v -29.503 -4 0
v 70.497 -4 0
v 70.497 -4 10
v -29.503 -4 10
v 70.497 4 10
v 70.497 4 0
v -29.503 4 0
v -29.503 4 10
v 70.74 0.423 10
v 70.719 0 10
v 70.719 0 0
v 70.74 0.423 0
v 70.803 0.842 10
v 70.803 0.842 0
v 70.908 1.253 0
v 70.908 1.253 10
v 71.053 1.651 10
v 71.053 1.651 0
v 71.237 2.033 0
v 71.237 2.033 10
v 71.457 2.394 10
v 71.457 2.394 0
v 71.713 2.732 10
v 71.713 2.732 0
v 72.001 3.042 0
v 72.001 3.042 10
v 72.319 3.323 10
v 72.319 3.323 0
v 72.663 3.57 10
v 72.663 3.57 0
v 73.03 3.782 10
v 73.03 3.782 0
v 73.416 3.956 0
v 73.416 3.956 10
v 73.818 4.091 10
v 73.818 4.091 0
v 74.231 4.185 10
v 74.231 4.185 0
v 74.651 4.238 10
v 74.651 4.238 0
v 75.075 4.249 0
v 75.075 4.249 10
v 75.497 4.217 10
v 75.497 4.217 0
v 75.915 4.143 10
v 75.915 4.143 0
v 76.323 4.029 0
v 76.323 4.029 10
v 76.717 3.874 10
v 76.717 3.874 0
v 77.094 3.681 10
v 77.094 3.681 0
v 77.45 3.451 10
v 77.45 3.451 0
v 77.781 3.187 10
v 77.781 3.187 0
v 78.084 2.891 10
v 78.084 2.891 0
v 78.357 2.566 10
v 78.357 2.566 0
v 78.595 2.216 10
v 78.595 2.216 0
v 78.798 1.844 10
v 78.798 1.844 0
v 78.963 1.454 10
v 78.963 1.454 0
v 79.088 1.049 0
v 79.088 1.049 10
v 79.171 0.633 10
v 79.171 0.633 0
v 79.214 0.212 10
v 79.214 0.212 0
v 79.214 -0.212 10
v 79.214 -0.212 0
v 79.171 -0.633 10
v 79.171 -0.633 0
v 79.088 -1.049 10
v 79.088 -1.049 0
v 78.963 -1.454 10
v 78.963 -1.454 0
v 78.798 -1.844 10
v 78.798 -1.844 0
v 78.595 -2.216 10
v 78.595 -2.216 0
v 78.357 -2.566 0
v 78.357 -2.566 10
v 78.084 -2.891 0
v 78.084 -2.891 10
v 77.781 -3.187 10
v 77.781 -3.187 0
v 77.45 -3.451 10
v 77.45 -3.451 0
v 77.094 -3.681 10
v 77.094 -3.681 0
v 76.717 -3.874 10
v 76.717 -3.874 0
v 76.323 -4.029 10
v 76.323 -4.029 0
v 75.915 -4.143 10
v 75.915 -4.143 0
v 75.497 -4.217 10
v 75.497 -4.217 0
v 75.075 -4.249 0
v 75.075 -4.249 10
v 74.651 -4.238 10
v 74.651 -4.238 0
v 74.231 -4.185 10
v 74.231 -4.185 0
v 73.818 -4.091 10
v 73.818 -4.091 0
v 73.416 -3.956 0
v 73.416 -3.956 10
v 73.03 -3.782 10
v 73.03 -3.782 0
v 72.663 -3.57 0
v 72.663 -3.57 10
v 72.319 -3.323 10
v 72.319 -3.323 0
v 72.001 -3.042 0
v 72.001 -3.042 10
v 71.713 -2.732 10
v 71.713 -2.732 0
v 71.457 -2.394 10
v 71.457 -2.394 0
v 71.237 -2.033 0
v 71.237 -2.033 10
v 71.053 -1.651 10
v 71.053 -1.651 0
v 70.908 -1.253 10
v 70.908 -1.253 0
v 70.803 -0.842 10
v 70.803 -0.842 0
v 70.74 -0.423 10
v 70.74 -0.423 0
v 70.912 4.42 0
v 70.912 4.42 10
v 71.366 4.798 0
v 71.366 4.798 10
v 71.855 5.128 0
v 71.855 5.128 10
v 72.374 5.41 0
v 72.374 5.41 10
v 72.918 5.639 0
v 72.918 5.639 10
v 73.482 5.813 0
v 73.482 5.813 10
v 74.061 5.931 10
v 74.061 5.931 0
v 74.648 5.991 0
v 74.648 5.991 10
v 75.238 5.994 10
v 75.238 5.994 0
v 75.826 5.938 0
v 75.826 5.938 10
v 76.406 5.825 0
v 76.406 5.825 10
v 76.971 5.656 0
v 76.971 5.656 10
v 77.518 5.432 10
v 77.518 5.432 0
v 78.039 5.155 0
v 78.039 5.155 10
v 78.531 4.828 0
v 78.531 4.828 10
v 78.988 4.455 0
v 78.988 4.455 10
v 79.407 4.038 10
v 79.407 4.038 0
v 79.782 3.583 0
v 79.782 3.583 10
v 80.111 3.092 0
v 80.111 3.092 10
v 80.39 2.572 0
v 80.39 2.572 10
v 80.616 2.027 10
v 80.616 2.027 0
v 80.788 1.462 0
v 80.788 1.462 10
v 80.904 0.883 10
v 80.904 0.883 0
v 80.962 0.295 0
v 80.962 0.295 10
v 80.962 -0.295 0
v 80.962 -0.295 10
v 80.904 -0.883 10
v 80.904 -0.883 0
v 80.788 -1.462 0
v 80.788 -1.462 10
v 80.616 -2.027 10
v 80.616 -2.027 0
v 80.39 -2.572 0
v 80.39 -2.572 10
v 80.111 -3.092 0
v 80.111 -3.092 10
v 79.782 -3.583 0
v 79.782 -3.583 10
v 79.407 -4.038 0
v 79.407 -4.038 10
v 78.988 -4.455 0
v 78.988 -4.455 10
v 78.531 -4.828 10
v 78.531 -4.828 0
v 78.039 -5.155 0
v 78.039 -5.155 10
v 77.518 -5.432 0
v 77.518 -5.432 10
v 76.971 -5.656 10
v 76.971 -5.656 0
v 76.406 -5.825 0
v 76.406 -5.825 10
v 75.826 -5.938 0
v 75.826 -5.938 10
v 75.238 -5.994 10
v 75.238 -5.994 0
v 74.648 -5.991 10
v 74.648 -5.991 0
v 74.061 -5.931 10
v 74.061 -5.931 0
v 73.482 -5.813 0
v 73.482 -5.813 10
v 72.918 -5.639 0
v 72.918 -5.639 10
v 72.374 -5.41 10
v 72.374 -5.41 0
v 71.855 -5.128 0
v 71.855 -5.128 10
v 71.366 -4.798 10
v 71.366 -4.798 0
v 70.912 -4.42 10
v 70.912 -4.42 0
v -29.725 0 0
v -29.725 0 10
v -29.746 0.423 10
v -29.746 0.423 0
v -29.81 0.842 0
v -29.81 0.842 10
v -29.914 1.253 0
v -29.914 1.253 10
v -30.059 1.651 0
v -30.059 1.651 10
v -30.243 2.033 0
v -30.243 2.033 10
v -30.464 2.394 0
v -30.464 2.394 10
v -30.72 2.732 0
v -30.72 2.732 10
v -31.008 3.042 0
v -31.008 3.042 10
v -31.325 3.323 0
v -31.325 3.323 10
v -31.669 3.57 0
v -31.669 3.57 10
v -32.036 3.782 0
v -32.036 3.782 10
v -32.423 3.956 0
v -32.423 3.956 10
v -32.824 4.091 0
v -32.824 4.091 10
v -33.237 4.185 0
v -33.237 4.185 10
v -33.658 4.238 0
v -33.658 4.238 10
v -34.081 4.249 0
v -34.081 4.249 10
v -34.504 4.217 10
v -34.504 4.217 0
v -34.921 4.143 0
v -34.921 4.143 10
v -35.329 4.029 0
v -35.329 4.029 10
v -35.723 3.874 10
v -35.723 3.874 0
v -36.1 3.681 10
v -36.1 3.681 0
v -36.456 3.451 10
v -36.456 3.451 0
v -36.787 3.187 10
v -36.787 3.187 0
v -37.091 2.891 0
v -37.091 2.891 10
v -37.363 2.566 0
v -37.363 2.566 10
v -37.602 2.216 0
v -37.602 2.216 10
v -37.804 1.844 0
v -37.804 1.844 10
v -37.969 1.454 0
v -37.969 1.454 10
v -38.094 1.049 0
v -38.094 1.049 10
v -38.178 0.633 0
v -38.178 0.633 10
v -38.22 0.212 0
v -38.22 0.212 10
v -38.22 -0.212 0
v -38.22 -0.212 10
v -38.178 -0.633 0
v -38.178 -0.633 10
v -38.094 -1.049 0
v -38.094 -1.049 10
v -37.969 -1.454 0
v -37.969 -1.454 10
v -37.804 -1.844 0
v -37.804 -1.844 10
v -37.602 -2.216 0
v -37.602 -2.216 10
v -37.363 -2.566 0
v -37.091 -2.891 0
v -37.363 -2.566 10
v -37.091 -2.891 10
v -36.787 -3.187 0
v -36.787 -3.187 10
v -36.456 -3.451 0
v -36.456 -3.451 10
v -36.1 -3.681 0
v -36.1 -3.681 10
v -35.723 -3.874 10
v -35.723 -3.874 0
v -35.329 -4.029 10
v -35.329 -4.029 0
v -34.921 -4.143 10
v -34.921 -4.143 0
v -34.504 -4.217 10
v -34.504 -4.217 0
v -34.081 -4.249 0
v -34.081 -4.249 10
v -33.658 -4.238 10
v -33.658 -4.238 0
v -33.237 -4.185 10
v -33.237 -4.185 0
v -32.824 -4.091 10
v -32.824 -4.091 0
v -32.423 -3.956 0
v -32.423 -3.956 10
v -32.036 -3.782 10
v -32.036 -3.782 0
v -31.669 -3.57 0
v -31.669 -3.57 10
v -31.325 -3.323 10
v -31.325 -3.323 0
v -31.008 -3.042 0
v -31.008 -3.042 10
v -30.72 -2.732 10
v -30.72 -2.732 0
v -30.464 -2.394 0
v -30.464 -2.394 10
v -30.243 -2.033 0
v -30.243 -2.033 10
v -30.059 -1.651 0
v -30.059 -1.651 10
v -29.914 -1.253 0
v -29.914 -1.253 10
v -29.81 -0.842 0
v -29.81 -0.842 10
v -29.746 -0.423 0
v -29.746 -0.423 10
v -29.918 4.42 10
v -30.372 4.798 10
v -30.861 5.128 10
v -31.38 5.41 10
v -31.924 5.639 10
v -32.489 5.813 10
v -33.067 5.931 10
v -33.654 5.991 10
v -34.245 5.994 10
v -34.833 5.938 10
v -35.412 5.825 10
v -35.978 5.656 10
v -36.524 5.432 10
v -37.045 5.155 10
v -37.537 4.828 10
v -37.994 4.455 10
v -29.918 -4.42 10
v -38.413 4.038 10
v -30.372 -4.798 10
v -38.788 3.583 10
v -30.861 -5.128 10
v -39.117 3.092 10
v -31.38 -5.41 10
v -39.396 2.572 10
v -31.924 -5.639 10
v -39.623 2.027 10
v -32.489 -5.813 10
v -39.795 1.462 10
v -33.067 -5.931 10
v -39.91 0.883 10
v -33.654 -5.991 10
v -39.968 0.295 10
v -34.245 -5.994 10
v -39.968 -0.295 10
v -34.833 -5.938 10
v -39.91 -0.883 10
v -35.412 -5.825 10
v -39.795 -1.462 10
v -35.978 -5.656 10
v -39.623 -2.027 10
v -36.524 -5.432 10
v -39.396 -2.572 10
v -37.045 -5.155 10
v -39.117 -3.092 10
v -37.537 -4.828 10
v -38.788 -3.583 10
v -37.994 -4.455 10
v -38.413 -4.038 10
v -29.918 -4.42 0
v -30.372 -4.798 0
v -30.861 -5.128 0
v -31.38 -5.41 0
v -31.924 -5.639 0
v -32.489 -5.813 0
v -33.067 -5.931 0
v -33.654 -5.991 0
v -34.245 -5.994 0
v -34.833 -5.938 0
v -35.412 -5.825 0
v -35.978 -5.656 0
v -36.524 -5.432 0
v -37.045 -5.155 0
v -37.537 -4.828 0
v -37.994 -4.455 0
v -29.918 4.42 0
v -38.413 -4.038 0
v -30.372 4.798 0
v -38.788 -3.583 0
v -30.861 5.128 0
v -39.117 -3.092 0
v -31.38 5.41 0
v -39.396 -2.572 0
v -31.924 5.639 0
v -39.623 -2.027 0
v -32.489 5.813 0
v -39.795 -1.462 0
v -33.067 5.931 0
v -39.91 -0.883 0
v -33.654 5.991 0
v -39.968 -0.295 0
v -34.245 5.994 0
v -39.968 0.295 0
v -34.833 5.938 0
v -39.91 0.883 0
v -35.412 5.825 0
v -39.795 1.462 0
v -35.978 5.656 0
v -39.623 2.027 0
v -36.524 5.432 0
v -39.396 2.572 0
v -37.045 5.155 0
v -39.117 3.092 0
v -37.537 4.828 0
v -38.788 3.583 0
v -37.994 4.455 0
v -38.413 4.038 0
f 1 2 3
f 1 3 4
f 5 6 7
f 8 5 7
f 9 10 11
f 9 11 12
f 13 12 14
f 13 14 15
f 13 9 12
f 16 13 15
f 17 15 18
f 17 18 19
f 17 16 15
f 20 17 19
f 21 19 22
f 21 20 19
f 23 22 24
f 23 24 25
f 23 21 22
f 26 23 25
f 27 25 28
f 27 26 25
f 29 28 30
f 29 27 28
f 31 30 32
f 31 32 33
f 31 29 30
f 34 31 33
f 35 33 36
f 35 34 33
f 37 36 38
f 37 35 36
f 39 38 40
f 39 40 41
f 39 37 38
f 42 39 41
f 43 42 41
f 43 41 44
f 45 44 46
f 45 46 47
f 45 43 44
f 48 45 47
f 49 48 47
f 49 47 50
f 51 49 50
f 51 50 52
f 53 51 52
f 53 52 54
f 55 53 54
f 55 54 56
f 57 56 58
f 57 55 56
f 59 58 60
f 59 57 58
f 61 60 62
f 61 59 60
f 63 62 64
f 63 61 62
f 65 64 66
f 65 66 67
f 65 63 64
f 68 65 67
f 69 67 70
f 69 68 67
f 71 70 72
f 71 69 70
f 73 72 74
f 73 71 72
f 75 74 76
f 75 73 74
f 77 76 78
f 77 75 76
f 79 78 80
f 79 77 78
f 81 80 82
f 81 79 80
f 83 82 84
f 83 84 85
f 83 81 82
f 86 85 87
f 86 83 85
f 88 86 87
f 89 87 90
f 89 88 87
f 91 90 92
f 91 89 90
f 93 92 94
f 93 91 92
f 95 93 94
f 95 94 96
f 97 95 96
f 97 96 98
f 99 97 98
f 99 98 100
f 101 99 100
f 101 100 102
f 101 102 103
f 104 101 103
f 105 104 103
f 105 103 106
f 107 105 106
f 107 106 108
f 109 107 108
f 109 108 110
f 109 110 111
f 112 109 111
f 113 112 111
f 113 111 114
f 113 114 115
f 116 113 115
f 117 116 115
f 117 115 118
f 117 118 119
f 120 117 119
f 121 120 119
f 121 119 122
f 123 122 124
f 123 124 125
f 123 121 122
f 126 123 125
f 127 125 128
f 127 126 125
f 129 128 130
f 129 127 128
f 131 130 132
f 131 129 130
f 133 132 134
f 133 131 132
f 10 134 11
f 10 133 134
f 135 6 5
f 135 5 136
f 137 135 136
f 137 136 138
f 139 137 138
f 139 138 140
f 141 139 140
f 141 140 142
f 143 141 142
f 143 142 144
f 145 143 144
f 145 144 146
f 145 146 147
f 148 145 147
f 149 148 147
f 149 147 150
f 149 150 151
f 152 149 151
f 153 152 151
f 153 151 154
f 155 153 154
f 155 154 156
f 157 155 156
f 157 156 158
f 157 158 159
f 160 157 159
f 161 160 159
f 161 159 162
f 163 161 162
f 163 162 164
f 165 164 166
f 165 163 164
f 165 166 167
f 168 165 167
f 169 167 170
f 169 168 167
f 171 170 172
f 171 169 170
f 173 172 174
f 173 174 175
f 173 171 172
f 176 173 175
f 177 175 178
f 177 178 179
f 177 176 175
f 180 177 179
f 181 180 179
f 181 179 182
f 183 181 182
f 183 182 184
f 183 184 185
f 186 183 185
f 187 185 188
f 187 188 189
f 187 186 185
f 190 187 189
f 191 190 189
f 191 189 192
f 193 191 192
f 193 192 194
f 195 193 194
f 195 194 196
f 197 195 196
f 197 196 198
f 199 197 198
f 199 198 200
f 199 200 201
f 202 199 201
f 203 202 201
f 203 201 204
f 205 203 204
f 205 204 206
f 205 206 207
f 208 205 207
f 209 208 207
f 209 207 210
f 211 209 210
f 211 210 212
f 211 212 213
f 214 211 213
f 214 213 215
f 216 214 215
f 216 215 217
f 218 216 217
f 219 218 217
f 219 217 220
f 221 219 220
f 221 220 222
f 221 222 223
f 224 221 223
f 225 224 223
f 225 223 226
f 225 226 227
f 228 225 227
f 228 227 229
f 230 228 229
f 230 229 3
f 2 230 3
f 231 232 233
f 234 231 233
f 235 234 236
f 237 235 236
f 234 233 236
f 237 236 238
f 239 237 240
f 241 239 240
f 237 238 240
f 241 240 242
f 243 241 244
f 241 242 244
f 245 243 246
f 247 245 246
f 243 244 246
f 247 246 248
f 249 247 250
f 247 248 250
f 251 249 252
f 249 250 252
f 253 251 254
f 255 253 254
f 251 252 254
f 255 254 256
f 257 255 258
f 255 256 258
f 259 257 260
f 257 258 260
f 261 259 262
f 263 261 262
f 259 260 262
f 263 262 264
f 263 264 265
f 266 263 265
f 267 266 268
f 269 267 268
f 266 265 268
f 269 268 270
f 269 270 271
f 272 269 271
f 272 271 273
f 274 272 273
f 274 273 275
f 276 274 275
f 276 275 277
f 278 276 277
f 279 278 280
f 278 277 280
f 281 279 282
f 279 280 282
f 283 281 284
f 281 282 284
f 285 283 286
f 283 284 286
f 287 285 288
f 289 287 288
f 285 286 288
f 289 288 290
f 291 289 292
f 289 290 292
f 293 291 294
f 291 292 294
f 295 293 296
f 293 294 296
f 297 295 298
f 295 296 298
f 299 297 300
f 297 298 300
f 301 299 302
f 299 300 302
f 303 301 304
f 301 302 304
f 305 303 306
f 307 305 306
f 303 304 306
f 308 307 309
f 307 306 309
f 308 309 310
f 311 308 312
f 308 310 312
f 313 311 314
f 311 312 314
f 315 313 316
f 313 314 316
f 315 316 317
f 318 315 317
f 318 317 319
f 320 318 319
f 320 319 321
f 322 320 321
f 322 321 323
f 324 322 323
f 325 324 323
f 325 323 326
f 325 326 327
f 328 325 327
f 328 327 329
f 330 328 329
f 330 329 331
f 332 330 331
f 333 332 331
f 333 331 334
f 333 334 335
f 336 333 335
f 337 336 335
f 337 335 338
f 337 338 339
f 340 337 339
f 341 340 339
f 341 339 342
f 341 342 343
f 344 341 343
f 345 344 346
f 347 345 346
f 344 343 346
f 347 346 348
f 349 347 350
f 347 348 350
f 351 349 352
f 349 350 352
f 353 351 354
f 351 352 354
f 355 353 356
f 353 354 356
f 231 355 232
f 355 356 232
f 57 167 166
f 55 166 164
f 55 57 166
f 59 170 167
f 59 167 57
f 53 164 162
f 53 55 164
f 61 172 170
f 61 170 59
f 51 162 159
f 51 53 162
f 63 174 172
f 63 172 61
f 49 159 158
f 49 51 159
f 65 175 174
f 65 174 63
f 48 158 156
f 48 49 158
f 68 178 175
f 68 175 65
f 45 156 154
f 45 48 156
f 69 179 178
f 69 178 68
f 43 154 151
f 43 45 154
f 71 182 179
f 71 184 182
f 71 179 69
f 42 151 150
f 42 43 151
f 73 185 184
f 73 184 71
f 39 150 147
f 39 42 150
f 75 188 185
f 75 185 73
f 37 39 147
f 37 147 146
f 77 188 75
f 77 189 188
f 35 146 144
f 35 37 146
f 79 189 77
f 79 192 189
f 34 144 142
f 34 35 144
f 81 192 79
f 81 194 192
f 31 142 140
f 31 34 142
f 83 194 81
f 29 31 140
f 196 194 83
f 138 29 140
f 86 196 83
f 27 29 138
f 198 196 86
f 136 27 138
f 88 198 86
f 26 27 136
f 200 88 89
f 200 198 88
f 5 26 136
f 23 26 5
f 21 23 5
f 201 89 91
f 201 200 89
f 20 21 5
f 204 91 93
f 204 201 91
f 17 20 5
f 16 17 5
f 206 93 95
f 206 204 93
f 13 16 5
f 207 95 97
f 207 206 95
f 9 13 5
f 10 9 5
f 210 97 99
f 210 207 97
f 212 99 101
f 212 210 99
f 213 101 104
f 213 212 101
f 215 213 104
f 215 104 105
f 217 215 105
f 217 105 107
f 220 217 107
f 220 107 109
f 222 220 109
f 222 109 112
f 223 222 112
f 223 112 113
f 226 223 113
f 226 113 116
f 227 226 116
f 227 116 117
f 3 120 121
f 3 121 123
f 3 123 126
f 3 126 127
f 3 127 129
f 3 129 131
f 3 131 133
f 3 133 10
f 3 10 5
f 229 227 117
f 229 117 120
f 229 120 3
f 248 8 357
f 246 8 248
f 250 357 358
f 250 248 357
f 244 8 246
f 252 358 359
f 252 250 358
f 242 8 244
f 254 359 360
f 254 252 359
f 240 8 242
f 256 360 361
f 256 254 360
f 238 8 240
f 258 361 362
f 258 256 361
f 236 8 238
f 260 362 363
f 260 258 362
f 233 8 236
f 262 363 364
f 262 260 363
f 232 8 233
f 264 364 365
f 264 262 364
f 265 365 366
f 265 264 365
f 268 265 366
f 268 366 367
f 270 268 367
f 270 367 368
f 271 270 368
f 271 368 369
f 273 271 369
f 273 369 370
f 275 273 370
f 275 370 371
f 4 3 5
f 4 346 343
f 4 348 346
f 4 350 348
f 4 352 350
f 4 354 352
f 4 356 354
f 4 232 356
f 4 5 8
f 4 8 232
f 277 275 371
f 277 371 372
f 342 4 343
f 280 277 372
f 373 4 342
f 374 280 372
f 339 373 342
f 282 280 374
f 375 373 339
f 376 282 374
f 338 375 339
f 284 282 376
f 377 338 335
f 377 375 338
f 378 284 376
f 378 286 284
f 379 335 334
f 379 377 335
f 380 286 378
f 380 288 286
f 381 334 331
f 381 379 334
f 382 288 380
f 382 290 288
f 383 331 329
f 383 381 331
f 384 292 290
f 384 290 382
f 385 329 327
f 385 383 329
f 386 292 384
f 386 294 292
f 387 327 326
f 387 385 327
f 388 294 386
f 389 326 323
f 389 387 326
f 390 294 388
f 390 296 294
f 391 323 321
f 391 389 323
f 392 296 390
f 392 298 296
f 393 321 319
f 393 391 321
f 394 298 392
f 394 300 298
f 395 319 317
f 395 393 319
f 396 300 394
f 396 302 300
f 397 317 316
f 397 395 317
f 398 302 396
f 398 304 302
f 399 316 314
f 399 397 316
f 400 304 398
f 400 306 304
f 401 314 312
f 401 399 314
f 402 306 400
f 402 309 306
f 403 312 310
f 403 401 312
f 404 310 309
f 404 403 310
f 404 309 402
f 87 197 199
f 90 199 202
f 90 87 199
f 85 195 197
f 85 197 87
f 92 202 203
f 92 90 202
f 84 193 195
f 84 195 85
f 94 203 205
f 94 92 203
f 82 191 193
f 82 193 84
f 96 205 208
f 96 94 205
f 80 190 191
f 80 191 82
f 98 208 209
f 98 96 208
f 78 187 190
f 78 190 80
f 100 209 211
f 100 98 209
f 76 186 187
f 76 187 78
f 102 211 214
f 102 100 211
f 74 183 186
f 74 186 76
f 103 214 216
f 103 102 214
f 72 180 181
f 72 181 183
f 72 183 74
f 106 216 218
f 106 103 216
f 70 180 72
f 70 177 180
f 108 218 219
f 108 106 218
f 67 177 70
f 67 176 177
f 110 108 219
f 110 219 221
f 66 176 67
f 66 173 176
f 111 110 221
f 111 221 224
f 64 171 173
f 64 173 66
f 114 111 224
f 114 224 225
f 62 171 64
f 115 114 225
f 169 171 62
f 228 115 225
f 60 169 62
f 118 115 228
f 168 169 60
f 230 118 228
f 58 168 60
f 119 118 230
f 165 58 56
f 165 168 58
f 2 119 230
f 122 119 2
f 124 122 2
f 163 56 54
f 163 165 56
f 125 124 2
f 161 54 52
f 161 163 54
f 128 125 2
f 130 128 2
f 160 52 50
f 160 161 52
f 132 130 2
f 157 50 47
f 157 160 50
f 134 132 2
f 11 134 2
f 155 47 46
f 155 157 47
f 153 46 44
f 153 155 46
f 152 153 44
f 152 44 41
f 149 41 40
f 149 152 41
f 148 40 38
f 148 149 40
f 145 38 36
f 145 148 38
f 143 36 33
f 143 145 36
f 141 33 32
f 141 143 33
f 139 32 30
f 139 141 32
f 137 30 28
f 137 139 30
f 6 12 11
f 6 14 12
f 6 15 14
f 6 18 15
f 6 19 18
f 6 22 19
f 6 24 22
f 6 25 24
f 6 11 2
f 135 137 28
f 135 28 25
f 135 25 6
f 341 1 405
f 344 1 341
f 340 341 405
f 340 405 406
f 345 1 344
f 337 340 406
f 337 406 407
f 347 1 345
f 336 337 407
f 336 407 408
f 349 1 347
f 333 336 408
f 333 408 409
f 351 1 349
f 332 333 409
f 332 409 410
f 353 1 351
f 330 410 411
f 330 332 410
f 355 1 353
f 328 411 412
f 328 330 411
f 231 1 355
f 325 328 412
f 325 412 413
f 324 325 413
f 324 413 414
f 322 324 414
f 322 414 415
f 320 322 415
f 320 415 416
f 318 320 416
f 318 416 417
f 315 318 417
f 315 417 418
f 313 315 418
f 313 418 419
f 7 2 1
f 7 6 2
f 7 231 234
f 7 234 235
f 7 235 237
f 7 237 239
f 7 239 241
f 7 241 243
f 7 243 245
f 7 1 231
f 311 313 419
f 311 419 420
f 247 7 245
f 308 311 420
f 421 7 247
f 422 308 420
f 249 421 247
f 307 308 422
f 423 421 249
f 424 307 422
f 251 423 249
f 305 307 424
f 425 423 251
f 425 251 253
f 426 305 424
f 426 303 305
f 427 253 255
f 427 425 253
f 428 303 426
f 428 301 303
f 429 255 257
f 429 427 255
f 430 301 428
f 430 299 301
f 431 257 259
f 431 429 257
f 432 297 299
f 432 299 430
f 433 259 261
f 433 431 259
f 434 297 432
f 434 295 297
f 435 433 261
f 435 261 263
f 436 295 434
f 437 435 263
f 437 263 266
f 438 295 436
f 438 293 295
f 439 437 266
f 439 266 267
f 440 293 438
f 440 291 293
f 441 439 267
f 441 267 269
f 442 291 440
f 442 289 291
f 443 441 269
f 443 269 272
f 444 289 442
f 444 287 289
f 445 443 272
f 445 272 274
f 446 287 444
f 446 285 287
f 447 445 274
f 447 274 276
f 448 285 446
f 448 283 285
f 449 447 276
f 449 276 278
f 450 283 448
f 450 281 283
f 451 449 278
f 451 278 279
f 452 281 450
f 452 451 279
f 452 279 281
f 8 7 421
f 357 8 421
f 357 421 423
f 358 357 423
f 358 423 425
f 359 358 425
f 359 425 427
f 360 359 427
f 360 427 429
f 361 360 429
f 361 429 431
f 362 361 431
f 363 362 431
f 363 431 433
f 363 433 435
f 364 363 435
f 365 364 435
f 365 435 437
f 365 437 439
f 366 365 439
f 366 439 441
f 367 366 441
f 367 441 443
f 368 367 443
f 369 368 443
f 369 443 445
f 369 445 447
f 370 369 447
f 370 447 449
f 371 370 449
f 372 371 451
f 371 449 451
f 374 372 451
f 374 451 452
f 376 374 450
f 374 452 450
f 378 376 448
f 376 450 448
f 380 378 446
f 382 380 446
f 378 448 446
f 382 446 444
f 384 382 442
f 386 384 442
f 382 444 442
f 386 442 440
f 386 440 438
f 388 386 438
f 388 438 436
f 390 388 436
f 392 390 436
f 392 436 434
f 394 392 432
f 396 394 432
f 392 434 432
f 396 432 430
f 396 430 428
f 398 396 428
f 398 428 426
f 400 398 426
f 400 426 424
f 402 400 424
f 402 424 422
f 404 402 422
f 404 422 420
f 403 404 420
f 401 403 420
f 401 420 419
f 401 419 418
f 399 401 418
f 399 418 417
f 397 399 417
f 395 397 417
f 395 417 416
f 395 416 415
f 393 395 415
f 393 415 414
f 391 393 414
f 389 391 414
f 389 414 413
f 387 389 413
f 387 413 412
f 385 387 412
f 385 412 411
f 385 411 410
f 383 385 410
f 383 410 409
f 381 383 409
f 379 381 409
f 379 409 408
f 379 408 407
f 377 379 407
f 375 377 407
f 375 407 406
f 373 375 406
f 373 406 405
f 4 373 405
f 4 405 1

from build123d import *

# Parameters (mm, degrees)
F0_R     = 6
F1_DEPTH = 10
F2_R     = 4.25
F3_DEPTH = 10
F4_W     = 50
F4_H     = 8
F5_DEPTH = 10


with BuildPart() as f1:
    # F0 (on Top) → F1 (new body)
    with BuildSketch(Plane.XY):
        with Locations((-33.975307, 0)):
            Circle(F0_R)
    extrude(amount=F1_DEPTH)

    # F2 (on face) → F3 (cut)
    with BuildSketch(Plane.XY.offset(10)):
        with Locations((-33.975307, 0)):
            Circle(F2_R)
    extrude(amount=-F3_DEPTH, mode=Mode.SUBTRACT)

    # F4 (on face) → F5 (join)
    with BuildSketch(Plane(origin=(0, 0, 0), x_dir=(1, 0, 0), z_dir=(0, 0, -1))):
        with Locations((-4.503171, 0)):
            Rectangle(F4_W, F4_H)
    extrude(amount=-F5_DEPTH)

    # F6: F1 across face


with BuildPart() as f1_1:
    add(f1.part)
    add(f1.part.mirror(Plane(origin=(20.496829, 0, 5), x_dir=(0, 1, 0), z_dir=(1, 0, 0))))


solid = f1_1.part
